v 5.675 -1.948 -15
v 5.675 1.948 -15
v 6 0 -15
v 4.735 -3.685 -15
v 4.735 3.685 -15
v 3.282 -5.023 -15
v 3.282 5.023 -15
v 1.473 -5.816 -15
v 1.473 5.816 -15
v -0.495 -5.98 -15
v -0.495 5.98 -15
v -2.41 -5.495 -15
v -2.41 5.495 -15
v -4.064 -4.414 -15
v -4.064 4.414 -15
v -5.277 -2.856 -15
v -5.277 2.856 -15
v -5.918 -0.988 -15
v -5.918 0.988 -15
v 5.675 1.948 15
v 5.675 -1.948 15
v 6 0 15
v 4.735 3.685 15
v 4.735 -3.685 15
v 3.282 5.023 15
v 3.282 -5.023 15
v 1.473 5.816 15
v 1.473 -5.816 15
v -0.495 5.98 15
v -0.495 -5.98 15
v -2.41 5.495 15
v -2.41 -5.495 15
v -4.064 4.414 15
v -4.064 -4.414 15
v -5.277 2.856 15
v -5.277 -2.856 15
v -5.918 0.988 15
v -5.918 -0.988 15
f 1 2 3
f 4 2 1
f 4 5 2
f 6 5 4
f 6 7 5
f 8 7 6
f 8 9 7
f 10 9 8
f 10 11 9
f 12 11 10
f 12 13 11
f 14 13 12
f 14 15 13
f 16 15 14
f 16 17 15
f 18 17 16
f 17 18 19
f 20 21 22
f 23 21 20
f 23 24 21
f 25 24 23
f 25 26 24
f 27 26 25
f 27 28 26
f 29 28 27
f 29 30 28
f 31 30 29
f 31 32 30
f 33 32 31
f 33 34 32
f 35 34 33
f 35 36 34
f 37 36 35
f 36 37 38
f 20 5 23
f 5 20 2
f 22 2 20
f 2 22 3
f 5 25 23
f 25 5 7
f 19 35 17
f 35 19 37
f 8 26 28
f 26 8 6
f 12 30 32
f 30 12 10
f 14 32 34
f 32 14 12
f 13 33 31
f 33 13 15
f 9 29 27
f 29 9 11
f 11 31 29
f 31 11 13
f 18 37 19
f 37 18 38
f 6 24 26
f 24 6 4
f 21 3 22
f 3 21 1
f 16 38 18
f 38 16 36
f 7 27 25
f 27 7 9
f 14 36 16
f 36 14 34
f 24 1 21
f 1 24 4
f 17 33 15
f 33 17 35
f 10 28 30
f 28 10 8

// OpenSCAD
intersection(){
  cylinder(h=30, r1=10, r2=10, center=true);
  cylinder(h=30, r1=6, r2=6, center=true);
}
